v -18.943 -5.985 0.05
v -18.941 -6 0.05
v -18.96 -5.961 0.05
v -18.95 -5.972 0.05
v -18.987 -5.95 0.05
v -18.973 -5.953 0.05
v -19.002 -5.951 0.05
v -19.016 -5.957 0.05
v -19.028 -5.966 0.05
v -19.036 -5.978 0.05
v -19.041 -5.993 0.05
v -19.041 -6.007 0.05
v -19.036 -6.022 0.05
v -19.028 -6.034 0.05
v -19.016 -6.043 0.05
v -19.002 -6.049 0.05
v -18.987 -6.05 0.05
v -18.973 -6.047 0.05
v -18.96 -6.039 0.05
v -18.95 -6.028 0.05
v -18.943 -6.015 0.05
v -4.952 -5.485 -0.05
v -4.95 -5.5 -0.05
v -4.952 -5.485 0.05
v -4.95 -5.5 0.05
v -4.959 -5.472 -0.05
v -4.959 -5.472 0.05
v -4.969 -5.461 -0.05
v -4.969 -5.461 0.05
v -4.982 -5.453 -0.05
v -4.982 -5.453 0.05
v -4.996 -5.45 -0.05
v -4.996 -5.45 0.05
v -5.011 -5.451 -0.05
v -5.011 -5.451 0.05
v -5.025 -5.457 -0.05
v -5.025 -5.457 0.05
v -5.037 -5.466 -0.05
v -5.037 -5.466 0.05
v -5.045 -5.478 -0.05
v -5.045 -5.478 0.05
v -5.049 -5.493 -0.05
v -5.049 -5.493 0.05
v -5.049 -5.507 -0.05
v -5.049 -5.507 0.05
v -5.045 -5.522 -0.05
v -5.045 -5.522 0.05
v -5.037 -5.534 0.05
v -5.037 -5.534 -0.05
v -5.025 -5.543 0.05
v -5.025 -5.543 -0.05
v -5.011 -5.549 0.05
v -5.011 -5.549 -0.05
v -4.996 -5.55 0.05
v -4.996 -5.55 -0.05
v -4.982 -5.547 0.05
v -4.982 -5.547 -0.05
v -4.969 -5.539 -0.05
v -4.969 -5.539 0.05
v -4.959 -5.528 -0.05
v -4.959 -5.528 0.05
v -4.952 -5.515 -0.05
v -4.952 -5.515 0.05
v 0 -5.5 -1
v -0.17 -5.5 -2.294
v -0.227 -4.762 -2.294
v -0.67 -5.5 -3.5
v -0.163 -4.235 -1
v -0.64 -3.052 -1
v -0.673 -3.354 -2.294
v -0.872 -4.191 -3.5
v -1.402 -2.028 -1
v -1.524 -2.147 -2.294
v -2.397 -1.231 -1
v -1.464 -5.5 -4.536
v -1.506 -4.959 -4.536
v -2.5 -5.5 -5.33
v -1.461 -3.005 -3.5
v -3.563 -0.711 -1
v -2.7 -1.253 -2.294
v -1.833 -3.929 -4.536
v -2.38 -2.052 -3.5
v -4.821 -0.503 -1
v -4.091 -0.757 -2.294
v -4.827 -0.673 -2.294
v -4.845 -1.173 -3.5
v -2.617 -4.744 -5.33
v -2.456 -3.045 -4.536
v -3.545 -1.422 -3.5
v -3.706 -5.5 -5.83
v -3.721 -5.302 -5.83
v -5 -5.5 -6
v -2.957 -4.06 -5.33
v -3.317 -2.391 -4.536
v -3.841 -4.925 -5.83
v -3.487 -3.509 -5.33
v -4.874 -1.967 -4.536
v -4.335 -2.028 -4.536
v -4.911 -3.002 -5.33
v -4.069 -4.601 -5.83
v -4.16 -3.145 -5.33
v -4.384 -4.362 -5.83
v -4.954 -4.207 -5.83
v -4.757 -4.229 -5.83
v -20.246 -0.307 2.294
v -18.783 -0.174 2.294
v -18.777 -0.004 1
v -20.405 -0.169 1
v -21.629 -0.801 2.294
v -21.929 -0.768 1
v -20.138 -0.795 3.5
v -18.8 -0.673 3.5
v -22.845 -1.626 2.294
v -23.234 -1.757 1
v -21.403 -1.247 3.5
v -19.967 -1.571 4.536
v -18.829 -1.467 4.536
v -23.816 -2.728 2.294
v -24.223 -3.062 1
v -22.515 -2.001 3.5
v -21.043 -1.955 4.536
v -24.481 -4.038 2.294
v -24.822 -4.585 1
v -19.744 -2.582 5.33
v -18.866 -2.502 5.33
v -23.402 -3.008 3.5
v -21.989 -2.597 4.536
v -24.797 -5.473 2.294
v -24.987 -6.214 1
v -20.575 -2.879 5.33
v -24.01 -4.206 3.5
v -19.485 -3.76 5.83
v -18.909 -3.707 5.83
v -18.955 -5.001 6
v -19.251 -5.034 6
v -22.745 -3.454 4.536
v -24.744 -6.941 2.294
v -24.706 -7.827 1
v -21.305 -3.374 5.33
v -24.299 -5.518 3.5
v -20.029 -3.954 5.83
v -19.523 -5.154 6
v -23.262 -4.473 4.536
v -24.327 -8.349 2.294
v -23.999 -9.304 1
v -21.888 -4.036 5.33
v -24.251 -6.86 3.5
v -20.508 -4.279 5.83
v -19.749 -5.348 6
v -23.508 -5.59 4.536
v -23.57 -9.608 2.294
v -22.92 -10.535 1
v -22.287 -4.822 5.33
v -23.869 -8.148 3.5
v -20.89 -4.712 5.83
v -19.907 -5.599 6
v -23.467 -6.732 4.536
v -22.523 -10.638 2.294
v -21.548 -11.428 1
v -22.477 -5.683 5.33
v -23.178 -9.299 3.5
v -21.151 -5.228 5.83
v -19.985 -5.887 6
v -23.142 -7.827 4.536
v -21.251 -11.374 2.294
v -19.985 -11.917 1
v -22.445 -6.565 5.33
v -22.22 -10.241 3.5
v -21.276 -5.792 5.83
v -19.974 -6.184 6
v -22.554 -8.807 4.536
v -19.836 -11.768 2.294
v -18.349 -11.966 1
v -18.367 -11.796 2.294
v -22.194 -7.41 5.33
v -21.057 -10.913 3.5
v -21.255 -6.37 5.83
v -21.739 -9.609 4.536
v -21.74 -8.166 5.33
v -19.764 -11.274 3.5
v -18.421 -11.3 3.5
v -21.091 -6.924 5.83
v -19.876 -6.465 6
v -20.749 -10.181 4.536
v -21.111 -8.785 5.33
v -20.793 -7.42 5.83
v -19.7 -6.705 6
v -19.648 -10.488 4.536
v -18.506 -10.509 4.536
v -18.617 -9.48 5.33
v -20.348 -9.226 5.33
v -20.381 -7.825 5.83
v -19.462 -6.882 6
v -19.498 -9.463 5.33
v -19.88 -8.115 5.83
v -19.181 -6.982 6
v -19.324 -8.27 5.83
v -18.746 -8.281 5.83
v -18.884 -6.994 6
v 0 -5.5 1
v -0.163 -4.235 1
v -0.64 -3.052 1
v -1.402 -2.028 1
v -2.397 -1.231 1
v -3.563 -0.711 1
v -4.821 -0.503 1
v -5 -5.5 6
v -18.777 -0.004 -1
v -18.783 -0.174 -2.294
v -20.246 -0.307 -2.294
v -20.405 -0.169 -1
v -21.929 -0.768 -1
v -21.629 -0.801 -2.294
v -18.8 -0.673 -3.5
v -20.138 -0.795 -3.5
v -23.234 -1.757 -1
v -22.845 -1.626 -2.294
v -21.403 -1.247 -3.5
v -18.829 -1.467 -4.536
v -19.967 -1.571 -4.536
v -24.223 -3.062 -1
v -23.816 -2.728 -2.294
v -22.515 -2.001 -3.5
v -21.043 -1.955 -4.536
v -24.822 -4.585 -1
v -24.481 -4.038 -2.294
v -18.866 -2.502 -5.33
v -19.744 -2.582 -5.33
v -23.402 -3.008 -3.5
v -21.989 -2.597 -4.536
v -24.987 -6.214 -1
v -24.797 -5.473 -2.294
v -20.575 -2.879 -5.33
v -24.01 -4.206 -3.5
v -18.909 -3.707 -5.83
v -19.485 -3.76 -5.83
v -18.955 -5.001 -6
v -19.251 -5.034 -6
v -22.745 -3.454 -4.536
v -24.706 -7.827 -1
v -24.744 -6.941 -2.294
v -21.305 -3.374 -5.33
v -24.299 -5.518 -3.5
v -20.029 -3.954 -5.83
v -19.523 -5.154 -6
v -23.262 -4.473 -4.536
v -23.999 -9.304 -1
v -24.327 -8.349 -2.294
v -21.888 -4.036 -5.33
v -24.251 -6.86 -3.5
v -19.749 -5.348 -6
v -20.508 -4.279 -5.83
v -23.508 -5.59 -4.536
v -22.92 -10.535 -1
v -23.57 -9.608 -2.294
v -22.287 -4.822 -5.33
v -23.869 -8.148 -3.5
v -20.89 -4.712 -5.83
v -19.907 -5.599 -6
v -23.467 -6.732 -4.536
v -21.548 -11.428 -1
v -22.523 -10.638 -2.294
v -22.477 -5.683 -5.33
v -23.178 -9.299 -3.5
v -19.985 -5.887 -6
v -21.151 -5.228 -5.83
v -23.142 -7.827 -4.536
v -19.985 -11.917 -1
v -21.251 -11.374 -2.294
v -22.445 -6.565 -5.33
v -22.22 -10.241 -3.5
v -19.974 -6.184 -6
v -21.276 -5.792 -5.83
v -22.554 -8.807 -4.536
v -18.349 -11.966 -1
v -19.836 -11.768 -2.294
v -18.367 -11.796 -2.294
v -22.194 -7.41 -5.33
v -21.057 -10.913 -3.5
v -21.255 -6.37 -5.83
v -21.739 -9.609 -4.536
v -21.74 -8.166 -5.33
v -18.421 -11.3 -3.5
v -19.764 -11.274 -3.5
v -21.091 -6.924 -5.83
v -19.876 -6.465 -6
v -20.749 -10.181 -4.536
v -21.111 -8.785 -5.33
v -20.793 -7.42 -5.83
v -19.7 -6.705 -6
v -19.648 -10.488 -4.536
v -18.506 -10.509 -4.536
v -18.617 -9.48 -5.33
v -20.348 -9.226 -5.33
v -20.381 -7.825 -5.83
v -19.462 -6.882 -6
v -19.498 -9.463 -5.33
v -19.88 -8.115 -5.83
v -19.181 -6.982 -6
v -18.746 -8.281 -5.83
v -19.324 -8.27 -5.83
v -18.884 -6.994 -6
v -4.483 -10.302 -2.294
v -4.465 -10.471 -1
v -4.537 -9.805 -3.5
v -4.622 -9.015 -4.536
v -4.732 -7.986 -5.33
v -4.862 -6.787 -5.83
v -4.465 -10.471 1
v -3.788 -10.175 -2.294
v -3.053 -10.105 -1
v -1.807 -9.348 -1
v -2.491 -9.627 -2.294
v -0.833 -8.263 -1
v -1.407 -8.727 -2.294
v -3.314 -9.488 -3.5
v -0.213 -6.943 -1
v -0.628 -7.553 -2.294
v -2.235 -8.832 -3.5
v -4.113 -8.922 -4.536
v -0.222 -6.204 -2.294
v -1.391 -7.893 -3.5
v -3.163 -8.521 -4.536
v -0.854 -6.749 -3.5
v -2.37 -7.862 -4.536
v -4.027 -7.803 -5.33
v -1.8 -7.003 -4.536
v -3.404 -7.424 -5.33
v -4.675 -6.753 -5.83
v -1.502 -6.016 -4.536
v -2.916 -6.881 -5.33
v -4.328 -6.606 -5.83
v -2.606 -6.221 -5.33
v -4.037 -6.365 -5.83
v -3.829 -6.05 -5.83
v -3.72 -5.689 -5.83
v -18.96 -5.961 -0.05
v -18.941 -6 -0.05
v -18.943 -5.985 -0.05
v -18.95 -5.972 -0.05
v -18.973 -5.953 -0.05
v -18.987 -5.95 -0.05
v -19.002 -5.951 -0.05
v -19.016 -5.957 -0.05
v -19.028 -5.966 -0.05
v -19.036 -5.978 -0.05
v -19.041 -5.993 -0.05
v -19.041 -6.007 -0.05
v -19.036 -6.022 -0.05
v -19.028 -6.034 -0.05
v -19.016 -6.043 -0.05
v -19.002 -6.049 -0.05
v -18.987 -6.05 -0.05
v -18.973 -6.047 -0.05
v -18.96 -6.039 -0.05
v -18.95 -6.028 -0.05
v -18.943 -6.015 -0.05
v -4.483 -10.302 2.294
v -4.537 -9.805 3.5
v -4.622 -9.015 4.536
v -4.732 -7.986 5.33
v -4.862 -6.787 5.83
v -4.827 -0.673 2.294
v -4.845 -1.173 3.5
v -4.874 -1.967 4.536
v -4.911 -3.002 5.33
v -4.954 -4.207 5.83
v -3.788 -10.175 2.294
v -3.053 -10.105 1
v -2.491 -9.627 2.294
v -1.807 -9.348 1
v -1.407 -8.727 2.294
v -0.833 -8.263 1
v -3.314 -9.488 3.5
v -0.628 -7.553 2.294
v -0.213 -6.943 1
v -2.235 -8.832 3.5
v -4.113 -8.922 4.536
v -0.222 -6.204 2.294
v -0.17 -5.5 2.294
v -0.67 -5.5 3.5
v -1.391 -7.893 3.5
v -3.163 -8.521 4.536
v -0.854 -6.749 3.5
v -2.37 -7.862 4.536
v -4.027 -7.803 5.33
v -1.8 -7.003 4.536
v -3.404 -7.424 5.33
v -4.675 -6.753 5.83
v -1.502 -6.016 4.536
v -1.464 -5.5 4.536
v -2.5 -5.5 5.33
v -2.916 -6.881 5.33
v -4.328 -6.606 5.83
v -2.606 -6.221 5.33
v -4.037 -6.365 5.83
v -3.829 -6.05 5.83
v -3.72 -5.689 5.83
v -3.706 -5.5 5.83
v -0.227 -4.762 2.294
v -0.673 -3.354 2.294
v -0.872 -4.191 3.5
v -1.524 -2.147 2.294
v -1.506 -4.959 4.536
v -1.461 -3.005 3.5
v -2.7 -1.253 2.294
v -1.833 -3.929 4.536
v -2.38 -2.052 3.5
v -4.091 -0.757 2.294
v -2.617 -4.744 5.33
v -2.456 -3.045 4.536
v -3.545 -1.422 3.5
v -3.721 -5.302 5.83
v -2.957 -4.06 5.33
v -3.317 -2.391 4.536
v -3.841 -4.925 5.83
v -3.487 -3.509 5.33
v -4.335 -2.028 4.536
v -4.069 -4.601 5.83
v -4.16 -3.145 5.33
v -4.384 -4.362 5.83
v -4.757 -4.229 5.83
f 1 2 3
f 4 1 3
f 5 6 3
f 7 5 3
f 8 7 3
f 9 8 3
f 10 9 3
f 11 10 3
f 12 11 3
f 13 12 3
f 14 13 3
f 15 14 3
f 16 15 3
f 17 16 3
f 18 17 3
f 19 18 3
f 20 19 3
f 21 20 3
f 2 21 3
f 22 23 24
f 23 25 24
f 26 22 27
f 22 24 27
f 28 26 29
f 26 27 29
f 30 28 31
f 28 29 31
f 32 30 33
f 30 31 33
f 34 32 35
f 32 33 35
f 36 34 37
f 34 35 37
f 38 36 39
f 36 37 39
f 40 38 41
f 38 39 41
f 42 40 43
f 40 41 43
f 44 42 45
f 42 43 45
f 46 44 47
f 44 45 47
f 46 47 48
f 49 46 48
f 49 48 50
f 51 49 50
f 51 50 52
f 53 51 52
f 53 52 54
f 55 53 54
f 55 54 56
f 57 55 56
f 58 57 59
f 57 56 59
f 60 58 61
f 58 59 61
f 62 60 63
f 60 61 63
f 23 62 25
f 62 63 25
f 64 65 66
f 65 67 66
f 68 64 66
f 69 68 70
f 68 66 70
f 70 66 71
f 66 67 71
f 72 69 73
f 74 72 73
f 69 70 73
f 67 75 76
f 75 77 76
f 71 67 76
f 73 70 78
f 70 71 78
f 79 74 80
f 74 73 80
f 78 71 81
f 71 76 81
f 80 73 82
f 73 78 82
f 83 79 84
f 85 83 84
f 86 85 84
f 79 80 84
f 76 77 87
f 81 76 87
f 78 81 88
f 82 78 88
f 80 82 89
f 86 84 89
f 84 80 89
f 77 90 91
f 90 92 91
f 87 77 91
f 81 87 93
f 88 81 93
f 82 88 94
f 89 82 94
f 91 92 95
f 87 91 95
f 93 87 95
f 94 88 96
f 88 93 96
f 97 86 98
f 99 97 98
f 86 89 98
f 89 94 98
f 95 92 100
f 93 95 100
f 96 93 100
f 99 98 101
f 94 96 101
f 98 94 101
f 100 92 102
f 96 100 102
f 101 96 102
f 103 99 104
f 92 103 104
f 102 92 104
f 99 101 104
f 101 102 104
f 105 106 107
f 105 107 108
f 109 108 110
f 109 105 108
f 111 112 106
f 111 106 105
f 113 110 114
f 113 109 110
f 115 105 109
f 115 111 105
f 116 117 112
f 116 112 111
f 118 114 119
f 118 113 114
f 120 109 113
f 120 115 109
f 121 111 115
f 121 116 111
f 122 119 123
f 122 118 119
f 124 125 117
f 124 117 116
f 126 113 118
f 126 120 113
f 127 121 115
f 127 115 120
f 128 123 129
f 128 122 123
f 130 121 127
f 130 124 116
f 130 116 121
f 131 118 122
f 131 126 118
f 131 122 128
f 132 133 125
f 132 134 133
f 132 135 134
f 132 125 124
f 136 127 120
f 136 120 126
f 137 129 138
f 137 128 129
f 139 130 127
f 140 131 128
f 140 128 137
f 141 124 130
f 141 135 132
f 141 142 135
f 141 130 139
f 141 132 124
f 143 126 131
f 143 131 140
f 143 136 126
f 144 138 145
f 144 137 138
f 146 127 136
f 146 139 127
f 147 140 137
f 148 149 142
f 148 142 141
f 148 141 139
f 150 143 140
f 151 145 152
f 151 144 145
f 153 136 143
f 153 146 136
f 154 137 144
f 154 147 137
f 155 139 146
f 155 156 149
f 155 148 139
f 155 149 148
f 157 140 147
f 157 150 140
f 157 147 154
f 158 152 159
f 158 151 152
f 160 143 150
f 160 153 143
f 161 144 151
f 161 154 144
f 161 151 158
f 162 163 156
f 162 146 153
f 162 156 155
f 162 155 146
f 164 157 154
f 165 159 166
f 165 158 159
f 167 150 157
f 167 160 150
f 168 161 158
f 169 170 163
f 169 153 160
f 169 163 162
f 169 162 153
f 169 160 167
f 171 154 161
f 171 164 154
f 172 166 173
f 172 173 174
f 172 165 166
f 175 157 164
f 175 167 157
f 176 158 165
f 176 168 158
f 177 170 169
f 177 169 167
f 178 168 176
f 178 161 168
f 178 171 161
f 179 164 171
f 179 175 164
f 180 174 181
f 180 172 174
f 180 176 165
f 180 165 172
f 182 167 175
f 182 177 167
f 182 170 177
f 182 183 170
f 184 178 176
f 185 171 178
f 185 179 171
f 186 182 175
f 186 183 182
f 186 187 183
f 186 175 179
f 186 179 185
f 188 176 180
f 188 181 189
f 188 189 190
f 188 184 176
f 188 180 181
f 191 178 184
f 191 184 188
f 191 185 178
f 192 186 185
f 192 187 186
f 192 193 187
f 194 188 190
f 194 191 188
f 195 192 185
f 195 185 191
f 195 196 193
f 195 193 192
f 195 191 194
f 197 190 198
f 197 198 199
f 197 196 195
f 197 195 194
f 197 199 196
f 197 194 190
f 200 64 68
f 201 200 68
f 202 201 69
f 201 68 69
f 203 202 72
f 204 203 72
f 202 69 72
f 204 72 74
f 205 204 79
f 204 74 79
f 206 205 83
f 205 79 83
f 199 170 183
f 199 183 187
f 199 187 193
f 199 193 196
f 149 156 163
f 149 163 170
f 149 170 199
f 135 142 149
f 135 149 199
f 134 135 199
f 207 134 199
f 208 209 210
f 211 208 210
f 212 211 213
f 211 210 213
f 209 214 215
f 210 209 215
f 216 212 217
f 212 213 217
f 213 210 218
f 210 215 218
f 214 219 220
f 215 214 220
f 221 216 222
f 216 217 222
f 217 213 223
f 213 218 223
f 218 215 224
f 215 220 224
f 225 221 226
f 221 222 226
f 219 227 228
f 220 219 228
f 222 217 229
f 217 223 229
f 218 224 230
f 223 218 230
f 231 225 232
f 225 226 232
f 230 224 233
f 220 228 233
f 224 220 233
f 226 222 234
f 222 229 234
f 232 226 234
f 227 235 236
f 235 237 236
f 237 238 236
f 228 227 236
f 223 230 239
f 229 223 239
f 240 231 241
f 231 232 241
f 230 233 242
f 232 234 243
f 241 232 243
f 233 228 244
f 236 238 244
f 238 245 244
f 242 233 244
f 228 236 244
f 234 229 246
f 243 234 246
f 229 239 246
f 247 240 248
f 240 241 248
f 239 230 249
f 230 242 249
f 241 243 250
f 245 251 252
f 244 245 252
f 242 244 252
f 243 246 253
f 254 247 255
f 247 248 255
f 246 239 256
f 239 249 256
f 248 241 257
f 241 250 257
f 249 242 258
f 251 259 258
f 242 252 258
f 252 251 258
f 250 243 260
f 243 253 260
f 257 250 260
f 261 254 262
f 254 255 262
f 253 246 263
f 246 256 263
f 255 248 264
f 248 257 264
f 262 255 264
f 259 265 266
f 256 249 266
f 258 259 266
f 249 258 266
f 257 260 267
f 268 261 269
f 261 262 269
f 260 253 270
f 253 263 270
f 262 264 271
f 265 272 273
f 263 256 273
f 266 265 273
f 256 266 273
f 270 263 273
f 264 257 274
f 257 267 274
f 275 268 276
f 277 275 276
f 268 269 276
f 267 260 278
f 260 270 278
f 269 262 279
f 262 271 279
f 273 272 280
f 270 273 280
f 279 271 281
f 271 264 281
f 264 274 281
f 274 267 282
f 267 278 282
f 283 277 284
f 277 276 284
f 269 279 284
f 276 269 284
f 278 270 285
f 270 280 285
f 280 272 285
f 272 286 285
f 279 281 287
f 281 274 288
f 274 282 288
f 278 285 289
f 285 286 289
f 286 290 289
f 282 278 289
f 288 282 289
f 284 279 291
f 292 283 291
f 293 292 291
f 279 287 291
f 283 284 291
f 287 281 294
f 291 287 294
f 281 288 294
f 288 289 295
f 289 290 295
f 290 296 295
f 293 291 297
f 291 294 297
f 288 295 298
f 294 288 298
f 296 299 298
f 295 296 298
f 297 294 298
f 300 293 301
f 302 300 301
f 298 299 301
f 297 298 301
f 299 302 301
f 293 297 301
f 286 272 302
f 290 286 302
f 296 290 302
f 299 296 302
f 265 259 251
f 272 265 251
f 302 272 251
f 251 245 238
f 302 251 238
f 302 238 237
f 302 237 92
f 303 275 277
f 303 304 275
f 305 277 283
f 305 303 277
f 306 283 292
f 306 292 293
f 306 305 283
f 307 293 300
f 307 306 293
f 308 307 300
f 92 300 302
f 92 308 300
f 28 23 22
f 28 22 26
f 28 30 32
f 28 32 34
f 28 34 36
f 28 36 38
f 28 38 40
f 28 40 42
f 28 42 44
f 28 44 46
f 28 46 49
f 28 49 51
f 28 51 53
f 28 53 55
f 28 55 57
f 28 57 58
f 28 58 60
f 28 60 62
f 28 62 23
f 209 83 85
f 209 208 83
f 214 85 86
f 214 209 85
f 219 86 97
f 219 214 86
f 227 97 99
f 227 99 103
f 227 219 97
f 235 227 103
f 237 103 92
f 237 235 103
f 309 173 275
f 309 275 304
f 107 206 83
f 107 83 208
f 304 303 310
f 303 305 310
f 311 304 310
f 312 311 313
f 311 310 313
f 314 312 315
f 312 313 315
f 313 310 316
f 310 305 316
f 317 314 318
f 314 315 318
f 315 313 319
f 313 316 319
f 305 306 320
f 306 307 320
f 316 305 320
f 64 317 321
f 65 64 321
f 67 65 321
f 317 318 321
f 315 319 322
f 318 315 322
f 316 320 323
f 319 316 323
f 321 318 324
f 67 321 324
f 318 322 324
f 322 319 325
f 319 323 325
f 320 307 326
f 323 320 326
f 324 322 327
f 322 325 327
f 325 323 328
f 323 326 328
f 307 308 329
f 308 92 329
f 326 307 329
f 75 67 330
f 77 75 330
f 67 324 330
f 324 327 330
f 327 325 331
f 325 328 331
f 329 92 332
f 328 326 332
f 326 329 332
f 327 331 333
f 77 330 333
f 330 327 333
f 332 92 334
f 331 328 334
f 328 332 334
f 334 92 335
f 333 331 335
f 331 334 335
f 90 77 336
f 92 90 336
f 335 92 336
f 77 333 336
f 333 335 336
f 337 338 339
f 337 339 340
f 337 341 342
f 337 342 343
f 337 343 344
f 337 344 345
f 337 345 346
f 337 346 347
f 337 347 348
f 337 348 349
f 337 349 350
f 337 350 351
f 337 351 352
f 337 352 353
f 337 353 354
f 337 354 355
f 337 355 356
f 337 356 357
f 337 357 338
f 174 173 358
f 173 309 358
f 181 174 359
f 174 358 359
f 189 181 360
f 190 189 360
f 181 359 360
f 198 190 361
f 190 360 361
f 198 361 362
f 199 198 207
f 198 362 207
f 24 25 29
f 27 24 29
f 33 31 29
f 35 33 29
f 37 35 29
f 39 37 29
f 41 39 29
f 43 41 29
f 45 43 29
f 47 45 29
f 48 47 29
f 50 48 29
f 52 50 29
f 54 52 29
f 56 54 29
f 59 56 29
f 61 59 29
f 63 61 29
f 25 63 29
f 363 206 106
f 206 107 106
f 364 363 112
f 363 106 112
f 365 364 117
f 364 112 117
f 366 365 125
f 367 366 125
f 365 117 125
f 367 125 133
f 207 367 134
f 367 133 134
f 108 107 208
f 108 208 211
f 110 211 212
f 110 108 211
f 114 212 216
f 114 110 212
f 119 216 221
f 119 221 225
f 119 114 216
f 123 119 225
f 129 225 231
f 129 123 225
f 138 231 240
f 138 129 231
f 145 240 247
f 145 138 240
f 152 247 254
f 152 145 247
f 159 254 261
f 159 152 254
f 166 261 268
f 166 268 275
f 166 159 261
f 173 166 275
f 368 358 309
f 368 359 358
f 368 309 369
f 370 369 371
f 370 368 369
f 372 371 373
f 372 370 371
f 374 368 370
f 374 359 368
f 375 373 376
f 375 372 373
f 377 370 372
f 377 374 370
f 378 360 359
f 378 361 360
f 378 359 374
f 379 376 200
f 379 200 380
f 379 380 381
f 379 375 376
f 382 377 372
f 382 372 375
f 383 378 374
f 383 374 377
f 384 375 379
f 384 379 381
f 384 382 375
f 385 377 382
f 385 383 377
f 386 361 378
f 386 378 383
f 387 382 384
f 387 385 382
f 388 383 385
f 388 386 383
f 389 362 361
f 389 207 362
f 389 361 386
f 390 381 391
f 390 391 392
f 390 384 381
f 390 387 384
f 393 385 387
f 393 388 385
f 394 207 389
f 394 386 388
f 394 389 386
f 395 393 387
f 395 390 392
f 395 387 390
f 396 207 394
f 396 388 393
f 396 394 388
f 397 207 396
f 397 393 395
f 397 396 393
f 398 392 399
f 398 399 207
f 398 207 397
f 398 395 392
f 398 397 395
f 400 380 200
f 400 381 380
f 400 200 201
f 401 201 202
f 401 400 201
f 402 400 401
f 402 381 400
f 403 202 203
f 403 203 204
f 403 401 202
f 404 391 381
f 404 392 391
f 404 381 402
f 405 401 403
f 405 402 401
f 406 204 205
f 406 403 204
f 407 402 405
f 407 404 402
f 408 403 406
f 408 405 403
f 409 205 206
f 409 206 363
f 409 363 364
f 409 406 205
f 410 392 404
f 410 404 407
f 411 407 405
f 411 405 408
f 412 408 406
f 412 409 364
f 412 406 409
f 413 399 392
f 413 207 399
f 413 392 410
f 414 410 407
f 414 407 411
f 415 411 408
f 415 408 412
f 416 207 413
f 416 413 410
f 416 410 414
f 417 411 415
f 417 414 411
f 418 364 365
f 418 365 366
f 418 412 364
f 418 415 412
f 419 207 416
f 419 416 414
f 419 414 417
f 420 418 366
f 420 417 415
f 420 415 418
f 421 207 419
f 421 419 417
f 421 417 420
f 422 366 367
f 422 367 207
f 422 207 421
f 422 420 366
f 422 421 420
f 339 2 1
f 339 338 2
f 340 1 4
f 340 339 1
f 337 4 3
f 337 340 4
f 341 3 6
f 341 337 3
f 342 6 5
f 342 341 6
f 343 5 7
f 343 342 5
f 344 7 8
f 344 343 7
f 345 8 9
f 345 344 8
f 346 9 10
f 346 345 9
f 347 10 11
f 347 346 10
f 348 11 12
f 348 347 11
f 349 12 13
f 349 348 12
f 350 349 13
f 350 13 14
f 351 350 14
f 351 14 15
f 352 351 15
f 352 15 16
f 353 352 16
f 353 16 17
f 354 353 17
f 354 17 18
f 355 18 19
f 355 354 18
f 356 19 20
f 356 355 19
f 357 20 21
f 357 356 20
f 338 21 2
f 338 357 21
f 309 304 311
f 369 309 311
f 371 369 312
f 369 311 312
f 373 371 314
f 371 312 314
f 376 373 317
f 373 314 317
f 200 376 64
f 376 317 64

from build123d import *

# Parameters (mm, degrees)
F1_R     = 0.05
F2_DEPTH = 6
F3_DEPTH = 0.05
F4_R     = 5


# Not quite as in the source:
# - a feature names something its author has since deleted; it is built from what else it names


with BuildPart() as f2:
    # F1 (on Top) → F2 (new body, symmetric)
    with BuildSketch(Plane.XY):
        with BuildLine():
            ThreePointArc((-18.3490321939, -11.9655502076), (-14.5272015165, -10.0092257161), (-12.9910685796, -6))
            ThreePointArc((-12.9910685796, -6), (-14.6732359116, -1.8339081802), (-18.7765089299, -0.0038375475))
            ThreePointArc((-18.7765089299, -0.0038375475), (-24.987240828, -6.2142857143), (-18.3490321939, -11.9655502076))
        make_face()
        with Locations((-18.9910685796, -6)):
            Circle(F1_R, mode=Mode.SUBTRACT)
        with BuildLine():
            ThreePointArc((-18.7765089299, -0.0038375475), (-14.6732359116, -1.8339081802), (-12.9910685796, -6))
            ThreePointArc((-12.9910685796, -6), (-14.5272015165, -10.0092257161), (-18.3490321939, -11.9655502076))
            Line((-18.3490321939, -11.9655502076), (-4.4649696785, -10.4712918397))
            ThreePointArc((-4.4649696785, -10.4712918397), (-9.996810207, -5.6785714286), (-4.8212002919, -0.5031979563))
            Line((-4.8212002919, -0.5031979563), (-18.7765089299, -0.0038375475))
        make_face()
        with BuildLine():
            ThreePointArc((0, -5.5), (-1.40180611, -2.0282568169), (-4.8212002919, -0.5031979563))
            ThreePointArc((-4.8212002919, -0.5031979563), (-9.996810207, -5.6785714286), (-4.4649696785, -10.4712918397))
            ThreePointArc((-4.4649696785, -10.4712918397), (-1.2801107807, -8.8410214301), (0, -5.5))
        make_face()
        with Locations((-5, -5.5)):
            Circle(F1_R, mode=Mode.SUBTRACT)
        with Locations((-18.9910685796, -6)):
            Circle(F1_R)
        with Locations((-5, -5.5)):
            Circle(F1_R)
    extrude(amount=F2_DEPTH, both=True)

    # F1 (on Top) → F3 (cut, symmetric)
    with BuildSketch(Plane.XY):
        with Locations((-18.9910685796, -6)):
            Circle(F1_R)
        with Locations((-5, -5.5)):
            Circle(F1_R)
    extrude(amount=F3_DEPTH, both=True, mode=Mode.SUBTRACT)

    # F4
    f4_edges = [f2.edges().sort_by_distance(p)[0] for p in [
        (-24.987241, -6.214286, 6),
        (-11.407001, -11.218421, 6),
        (-0.00319, -5.321429, 6),
        (-11.798855, -0.253518, 6),
        (-24.987241, -6.214286, -6),
        (-11.407001, -11.218421, -6),
        (-0.00319, -5.321429, -6),
        (-11.798855, -0.253518, -6),
    ]]
    fillet(f4_edges, radius=F4_R)


solid = f2.part
